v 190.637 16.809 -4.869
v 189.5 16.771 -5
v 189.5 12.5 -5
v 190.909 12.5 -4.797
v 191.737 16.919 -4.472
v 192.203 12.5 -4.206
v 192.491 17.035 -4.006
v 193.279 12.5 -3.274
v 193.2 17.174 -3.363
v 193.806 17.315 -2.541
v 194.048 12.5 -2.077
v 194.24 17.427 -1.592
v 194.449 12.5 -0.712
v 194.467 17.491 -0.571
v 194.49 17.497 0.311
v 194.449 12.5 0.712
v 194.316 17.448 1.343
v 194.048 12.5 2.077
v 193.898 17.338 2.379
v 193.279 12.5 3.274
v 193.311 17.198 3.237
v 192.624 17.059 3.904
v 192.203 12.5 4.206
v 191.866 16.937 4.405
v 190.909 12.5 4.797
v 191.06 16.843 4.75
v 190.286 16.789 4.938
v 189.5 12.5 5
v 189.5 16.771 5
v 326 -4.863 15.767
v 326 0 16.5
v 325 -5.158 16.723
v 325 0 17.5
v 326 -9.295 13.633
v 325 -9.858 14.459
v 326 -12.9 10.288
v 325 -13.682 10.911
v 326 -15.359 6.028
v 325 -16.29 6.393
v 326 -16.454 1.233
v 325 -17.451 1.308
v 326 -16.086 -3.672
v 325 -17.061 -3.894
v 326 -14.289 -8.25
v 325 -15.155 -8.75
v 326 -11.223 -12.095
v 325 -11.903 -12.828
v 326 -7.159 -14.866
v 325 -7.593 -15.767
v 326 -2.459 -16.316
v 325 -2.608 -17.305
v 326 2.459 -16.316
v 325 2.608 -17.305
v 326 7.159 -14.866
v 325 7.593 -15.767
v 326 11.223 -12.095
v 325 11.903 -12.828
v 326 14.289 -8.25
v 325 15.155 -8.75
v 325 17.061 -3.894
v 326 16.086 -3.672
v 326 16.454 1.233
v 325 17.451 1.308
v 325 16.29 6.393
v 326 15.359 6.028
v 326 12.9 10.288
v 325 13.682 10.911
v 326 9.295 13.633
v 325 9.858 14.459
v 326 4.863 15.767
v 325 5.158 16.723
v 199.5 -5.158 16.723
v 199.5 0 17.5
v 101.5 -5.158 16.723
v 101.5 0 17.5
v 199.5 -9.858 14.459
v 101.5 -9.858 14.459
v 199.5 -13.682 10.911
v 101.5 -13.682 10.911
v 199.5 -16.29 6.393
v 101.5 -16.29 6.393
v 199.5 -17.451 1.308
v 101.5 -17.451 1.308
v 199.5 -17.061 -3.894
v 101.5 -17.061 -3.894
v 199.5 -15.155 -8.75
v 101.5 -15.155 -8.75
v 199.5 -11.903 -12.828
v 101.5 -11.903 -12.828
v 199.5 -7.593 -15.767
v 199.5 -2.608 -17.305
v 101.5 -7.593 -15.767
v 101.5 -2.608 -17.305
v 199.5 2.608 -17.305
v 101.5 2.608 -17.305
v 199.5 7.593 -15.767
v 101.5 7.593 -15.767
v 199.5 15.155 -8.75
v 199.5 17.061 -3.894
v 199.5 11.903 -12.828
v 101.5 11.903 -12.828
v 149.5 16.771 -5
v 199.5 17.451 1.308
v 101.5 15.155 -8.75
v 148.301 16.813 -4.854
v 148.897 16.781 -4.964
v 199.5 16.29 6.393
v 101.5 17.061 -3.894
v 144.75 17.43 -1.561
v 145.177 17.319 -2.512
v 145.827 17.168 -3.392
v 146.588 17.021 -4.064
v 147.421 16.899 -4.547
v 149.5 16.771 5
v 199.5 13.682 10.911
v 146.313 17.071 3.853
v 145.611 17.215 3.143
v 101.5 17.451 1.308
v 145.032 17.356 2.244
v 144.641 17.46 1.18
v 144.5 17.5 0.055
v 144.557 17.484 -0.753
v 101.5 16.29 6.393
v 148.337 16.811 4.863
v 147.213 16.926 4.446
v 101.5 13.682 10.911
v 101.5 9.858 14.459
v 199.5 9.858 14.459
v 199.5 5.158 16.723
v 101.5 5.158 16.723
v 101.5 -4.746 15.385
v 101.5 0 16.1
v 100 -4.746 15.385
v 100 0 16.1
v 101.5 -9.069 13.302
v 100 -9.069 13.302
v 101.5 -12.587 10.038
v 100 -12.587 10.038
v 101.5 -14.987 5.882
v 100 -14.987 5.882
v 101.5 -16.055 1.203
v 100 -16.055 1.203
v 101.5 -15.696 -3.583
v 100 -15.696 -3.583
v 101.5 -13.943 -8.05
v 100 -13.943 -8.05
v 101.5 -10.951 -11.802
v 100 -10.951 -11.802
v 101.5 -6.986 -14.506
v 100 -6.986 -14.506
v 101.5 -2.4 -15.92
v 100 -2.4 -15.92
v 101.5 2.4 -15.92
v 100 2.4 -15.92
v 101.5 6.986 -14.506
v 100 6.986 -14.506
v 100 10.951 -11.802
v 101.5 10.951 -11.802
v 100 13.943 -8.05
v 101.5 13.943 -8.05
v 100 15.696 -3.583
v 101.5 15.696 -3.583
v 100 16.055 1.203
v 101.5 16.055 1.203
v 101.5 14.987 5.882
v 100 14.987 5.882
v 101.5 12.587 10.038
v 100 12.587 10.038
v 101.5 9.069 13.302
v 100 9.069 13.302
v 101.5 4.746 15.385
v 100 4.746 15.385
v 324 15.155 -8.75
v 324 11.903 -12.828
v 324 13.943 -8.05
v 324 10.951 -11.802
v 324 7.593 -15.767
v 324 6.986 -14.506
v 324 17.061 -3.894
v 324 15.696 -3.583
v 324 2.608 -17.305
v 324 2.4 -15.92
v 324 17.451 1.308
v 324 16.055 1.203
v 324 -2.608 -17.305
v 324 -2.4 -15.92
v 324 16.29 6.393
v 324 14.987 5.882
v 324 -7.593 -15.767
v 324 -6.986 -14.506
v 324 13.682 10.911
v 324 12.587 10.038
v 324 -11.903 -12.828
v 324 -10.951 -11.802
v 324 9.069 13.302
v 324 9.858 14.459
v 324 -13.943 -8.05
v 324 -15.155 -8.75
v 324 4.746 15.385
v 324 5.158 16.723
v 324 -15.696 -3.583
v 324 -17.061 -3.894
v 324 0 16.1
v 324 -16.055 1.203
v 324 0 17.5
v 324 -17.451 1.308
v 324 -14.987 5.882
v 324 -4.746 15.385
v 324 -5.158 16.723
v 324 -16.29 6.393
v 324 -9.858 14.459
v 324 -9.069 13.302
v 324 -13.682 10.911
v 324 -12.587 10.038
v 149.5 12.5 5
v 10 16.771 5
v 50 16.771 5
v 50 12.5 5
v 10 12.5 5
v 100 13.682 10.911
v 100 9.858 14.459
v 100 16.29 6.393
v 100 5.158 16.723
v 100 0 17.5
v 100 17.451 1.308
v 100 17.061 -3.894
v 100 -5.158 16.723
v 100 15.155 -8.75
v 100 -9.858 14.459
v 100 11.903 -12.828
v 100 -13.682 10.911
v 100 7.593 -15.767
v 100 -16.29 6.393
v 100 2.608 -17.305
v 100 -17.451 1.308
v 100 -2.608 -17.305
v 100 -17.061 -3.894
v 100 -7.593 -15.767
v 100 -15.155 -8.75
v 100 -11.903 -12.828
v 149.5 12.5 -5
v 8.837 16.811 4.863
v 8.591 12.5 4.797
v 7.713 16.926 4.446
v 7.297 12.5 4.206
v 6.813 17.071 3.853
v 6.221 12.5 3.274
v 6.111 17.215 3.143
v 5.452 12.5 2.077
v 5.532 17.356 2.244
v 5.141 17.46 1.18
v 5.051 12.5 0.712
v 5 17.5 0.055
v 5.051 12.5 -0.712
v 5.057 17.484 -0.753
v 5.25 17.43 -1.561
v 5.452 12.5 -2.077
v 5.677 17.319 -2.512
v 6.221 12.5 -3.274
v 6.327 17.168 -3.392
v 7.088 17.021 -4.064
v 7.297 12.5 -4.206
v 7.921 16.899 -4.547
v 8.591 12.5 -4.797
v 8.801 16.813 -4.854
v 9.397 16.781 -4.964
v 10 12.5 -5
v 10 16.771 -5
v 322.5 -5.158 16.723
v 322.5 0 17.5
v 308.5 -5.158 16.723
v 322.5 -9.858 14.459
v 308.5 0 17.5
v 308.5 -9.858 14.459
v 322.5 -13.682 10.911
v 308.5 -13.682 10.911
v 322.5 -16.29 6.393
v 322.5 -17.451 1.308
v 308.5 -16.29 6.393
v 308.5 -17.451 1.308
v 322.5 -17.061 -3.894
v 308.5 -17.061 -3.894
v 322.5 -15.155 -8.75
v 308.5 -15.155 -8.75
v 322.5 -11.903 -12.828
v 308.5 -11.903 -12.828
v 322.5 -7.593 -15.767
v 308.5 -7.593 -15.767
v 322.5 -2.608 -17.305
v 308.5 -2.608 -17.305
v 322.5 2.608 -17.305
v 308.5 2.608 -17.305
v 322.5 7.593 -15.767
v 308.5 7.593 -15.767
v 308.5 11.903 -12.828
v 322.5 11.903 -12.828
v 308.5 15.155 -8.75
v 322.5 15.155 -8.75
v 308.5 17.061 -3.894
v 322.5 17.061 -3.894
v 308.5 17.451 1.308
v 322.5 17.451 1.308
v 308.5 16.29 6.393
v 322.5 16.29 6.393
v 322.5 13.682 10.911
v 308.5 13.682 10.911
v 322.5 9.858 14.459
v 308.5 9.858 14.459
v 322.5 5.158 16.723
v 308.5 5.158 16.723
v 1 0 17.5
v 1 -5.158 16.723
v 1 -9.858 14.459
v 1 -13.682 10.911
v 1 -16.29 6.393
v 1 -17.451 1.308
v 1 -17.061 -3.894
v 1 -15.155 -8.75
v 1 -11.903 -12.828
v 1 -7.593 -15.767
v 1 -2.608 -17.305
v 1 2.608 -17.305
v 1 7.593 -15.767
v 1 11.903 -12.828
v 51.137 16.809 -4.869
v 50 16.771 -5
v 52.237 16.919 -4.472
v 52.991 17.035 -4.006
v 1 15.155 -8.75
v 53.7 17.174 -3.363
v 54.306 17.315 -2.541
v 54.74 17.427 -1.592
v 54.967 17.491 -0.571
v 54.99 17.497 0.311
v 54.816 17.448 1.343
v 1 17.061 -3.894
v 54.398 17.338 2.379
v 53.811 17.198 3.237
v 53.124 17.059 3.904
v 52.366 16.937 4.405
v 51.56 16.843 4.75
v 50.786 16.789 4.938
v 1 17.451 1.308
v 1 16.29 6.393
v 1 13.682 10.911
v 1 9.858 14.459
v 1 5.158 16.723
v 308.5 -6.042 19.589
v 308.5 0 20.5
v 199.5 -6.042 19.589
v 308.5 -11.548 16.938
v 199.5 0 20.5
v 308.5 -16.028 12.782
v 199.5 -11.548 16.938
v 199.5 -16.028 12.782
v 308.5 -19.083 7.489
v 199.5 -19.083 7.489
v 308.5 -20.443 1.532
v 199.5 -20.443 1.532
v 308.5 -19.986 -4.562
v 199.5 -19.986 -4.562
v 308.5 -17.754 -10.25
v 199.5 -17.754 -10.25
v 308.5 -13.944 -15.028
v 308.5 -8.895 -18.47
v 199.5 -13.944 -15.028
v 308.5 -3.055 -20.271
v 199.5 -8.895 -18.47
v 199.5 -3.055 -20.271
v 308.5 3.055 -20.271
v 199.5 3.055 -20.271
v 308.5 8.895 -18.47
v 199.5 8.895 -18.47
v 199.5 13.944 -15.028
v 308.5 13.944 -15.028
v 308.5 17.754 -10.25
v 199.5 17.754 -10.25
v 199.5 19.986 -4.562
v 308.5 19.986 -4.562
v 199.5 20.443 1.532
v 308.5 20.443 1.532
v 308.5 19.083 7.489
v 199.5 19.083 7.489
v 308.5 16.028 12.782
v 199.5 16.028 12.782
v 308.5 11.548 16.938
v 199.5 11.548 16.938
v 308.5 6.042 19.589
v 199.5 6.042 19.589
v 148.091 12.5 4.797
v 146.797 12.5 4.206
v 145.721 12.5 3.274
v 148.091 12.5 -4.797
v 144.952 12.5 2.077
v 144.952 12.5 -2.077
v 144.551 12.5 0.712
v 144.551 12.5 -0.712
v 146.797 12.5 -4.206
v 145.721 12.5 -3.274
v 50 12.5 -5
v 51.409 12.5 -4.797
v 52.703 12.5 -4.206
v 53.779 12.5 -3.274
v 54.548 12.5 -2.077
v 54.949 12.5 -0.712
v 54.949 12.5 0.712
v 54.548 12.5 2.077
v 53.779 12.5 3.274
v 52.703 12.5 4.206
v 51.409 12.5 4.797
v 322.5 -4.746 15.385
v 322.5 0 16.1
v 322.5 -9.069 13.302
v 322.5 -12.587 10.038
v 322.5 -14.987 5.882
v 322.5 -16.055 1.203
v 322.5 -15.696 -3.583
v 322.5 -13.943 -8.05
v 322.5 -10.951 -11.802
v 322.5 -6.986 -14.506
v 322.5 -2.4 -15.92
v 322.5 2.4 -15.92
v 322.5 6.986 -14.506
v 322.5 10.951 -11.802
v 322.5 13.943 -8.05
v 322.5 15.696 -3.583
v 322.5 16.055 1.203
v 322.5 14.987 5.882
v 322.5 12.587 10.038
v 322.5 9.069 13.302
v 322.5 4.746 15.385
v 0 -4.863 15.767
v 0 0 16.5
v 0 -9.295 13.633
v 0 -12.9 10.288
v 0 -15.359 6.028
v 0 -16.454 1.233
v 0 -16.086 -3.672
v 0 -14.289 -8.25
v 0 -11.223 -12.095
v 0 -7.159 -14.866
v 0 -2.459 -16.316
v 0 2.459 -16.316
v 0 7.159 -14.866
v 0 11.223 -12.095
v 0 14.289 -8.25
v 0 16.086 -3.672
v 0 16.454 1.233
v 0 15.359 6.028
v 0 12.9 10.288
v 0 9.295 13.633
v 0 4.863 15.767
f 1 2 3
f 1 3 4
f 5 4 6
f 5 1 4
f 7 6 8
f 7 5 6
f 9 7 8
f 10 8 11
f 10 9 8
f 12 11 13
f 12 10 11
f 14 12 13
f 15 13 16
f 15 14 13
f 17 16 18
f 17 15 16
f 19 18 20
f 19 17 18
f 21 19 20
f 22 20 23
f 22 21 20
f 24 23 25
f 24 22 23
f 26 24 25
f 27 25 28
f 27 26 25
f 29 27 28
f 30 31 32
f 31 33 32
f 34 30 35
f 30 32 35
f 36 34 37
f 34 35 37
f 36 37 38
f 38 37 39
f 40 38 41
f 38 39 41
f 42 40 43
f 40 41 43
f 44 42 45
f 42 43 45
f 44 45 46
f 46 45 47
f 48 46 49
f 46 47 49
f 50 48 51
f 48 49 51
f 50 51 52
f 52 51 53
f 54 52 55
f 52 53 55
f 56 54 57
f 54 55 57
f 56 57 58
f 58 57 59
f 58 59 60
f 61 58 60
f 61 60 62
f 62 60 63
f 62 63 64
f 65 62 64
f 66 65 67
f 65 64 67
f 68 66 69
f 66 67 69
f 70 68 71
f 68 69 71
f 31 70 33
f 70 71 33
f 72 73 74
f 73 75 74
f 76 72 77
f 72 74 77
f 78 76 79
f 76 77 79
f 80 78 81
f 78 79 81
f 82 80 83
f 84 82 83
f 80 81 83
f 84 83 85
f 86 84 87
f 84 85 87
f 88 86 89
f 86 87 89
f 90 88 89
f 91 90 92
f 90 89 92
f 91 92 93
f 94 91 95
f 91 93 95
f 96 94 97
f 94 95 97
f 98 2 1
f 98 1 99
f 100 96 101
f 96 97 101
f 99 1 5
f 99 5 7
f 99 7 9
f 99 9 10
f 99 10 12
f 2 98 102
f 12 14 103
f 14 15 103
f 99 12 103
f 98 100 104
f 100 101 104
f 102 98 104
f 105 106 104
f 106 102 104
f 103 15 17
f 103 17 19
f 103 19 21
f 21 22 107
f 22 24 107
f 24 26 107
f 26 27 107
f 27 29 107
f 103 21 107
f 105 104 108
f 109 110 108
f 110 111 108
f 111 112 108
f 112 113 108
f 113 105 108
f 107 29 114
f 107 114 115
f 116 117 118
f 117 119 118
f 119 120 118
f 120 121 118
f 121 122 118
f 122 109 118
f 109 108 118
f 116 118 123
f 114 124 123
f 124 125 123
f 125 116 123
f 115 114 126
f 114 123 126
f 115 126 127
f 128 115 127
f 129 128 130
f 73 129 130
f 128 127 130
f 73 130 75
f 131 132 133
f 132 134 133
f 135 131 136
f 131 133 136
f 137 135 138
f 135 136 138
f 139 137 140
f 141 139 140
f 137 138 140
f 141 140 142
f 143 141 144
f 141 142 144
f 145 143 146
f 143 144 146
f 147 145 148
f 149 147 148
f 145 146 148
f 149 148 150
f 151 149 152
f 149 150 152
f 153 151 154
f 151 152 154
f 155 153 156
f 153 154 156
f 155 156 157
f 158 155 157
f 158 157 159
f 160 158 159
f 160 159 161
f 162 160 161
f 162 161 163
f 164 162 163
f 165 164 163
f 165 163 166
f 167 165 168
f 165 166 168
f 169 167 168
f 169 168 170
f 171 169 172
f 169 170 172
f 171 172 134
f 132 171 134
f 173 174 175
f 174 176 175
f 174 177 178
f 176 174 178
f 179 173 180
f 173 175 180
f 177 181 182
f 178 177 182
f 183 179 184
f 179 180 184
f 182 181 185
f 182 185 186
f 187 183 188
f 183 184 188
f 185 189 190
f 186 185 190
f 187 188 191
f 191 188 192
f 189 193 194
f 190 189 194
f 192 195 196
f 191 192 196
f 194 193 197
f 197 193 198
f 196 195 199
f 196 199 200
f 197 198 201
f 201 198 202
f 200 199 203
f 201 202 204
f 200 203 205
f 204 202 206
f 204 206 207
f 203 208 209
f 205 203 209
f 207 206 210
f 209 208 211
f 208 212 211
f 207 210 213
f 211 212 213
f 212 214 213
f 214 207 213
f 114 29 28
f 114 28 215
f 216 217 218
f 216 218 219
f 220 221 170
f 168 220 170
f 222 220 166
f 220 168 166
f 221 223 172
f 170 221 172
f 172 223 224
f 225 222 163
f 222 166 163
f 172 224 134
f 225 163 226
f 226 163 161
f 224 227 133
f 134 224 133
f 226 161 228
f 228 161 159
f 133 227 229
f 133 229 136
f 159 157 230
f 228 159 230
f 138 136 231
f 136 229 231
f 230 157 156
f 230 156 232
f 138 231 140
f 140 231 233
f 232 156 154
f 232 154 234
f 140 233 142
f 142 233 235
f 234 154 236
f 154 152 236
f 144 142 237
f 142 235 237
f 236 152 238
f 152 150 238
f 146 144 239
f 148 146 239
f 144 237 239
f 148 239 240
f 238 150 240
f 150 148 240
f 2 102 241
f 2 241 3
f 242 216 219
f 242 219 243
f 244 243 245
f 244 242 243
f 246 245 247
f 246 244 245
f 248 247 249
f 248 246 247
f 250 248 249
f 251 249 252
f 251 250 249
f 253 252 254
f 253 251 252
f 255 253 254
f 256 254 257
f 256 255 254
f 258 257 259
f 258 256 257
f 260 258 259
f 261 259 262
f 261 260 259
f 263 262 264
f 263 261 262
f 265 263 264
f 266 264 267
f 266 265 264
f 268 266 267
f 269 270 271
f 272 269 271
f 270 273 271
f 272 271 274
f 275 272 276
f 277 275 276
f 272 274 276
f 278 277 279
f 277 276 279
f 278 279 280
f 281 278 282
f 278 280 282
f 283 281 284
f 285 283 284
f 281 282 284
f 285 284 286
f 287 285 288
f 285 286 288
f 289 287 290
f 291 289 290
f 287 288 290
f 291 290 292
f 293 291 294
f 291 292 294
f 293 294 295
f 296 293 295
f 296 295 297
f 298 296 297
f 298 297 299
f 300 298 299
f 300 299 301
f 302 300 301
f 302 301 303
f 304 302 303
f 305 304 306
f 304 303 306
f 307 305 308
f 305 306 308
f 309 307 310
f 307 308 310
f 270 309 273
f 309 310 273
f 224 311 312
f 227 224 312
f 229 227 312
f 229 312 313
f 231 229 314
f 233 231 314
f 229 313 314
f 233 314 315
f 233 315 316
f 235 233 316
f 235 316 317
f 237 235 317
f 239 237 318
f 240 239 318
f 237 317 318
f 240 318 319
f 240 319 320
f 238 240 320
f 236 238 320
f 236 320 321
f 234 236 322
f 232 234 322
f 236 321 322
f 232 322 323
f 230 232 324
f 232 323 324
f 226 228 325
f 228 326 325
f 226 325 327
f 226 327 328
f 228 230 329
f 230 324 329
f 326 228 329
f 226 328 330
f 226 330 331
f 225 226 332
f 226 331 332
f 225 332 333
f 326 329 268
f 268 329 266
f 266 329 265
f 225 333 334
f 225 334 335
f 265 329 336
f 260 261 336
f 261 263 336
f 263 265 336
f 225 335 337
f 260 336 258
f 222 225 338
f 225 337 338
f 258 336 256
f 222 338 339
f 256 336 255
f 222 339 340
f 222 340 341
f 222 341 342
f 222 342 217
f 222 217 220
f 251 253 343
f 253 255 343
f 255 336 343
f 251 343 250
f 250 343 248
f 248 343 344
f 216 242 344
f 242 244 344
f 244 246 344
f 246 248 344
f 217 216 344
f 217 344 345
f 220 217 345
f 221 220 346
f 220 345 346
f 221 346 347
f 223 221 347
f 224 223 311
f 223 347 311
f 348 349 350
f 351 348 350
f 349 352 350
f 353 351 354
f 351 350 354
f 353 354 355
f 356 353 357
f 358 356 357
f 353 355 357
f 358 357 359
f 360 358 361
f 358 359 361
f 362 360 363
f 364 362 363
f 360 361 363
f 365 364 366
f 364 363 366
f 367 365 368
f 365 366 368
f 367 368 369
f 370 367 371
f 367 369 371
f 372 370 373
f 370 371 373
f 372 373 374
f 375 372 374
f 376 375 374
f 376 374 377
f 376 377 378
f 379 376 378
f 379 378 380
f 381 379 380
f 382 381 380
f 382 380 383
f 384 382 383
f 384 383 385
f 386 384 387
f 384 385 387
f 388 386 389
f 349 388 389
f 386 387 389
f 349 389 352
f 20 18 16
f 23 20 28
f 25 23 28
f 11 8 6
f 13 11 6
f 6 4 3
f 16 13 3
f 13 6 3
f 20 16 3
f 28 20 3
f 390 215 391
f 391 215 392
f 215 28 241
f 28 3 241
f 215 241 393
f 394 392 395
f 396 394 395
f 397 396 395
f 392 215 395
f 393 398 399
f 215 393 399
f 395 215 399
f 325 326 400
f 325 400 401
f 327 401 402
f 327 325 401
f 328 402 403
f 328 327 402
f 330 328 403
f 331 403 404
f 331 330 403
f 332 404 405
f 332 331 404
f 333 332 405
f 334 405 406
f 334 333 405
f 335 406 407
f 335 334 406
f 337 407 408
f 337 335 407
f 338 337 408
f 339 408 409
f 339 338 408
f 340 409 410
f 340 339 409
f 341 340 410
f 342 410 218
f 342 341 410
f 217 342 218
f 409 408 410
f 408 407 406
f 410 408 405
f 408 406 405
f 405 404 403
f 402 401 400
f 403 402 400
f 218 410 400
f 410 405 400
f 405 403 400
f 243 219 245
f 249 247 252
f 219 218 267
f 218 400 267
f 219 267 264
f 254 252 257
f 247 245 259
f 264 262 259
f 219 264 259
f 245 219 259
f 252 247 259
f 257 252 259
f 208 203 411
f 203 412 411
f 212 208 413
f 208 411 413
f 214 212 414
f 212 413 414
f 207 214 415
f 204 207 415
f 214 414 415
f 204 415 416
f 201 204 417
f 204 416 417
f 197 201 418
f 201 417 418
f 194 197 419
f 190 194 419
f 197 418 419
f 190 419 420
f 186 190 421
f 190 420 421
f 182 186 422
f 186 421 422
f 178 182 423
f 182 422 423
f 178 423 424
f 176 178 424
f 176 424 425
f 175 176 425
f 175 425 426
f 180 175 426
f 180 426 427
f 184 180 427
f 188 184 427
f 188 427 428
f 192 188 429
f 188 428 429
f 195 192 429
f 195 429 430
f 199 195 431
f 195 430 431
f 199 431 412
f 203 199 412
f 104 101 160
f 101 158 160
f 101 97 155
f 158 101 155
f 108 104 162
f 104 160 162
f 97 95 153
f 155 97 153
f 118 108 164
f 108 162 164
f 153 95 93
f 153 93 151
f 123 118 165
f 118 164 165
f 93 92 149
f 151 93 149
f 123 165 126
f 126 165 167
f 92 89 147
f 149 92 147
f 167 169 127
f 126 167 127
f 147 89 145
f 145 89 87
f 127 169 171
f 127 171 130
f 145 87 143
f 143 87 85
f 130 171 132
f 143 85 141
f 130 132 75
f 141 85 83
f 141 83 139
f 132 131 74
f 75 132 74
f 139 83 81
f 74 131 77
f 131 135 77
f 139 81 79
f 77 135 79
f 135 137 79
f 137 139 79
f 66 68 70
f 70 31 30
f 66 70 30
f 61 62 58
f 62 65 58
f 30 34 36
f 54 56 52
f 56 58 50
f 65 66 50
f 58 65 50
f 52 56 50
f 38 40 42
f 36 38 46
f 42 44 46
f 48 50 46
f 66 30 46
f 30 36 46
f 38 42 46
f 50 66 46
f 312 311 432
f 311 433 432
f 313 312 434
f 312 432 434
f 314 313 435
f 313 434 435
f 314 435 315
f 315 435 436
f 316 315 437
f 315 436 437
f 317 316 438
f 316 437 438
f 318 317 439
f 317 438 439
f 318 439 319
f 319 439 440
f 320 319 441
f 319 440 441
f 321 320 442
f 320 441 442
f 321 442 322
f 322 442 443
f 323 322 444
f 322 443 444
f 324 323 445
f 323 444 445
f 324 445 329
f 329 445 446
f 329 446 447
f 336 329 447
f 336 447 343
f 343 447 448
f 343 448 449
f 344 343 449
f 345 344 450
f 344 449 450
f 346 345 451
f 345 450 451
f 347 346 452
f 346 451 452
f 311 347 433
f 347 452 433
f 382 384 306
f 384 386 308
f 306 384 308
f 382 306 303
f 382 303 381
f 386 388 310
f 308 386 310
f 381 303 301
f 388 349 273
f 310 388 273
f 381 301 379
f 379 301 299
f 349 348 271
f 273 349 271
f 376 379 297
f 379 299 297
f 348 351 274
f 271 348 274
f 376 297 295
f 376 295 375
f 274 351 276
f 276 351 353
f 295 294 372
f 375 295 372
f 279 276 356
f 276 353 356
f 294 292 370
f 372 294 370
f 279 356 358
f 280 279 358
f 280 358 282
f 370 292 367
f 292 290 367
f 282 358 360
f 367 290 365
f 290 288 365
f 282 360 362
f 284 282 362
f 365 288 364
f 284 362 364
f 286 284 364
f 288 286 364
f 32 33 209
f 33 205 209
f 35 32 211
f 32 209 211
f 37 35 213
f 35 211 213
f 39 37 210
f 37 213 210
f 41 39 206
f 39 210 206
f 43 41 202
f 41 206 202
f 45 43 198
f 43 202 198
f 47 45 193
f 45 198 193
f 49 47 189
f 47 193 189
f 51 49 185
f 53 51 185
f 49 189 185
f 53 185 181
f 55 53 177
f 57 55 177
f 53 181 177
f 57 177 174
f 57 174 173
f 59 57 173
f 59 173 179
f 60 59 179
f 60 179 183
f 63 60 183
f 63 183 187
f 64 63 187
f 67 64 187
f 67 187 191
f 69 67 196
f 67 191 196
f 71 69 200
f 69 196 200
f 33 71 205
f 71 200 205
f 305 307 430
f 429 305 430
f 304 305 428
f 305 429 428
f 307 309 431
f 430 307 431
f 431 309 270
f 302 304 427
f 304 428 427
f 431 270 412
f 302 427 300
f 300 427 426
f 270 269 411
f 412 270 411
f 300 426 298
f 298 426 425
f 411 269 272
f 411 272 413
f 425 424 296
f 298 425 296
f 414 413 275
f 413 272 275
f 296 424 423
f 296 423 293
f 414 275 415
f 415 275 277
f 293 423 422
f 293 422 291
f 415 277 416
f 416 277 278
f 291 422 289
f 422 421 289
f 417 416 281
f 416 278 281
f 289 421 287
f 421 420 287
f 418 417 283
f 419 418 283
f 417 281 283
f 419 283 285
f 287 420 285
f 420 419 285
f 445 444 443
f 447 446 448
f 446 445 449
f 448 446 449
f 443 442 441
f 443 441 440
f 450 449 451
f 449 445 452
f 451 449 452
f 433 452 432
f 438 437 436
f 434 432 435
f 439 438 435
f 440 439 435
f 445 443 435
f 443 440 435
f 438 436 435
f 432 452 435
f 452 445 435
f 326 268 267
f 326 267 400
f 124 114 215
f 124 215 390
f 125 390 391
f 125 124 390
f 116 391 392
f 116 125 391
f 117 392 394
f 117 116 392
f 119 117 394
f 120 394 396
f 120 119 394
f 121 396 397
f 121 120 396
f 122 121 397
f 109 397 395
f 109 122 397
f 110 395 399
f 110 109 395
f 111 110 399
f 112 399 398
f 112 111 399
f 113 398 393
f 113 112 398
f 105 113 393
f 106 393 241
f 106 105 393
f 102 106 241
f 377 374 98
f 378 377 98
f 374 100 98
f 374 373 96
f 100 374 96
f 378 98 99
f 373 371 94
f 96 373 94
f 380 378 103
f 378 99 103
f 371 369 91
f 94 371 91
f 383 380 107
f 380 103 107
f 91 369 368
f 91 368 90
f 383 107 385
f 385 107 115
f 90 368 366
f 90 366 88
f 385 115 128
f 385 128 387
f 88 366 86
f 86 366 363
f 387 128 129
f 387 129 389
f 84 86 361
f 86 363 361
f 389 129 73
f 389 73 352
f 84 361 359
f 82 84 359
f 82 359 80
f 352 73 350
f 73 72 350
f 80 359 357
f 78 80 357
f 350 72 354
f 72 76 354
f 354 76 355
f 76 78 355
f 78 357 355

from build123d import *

# Parameters (mm, degrees)
CUT_EXTRUDE1_DEPTH = 5
CUT_EXTRUDE2_DEPTH = 5


with BuildPart() as part:
    # Sketch1 → Revolve1 (revolve)
    with BuildSketch(Plane.XY, mode=Mode.PRIVATE) as revolve1_sk:
        Polygon((0, 0), (326, 0), (326, 16.5), (325, 17.5), (324, 17.5), (324, 16.1), (322.5, 16.1), (322.5, 17.5), (308.5, 17.5), (308.5, 20.5), (199.5, 20.5), (199.5, 17.5), (101.5, 17.5), (101.5, 16.1), (100, 16.1), (100, 17.5), (1, 17.5), (0, 16.5), align=None)
    revolve(revolve1_sk.sketch.rotate(Axis((0, 0, 0), (1, 0, 0)), 90), axis=Axis((0, 0, 0), (1, 0, 0)))

    # Sketch2 → Cut-Extrude1 (cut)
    with BuildSketch(Plane(origin=(0, 17.5, 0), x_dir=(1, 0, 0), z_dir=(0, 1, 0))):
        with BuildLine():
            Line((189.5, -5), (149.5, -5))
            ThreePointArc((149.5, -5), (144.5, 0), (149.5, 5))
            Line((149.5, 5), (189.5, 5))
            ThreePointArc((189.5, 5), (194.5, 0), (189.5, -5))
        make_face()
    extrude(amount=-CUT_EXTRUDE1_DEPTH, mode=Mode.SUBTRACT)

    # Sketch3 → Cut-Extrude2 (cut)
    with BuildSketch(Plane(origin=(0, 17.5, 0), x_dir=(1, 0, 0), z_dir=(0, 1, 0))):
        with BuildLine():
            Line((189.5, 5), (149.5, 5))
            ThreePointArc((149.5, 5), (144.5, 0), (149.5, -5))
            Line((149.5, -5), (189.5, -5))
            ThreePointArc((189.5, -5), (194.5, 0), (189.5, 5))
        make_face()
        with BuildLine():
            Line((10, 5), (50, 5))
            ThreePointArc((50, 5), (55, 0), (50, -5))
            Line((50, -5), (10, -5))
            ThreePointArc((10, -5), (5, 0), (10, 5))
        make_face()
    extrude(amount=-CUT_EXTRUDE2_DEPTH, mode=Mode.SUBTRACT)


solid = part.part
